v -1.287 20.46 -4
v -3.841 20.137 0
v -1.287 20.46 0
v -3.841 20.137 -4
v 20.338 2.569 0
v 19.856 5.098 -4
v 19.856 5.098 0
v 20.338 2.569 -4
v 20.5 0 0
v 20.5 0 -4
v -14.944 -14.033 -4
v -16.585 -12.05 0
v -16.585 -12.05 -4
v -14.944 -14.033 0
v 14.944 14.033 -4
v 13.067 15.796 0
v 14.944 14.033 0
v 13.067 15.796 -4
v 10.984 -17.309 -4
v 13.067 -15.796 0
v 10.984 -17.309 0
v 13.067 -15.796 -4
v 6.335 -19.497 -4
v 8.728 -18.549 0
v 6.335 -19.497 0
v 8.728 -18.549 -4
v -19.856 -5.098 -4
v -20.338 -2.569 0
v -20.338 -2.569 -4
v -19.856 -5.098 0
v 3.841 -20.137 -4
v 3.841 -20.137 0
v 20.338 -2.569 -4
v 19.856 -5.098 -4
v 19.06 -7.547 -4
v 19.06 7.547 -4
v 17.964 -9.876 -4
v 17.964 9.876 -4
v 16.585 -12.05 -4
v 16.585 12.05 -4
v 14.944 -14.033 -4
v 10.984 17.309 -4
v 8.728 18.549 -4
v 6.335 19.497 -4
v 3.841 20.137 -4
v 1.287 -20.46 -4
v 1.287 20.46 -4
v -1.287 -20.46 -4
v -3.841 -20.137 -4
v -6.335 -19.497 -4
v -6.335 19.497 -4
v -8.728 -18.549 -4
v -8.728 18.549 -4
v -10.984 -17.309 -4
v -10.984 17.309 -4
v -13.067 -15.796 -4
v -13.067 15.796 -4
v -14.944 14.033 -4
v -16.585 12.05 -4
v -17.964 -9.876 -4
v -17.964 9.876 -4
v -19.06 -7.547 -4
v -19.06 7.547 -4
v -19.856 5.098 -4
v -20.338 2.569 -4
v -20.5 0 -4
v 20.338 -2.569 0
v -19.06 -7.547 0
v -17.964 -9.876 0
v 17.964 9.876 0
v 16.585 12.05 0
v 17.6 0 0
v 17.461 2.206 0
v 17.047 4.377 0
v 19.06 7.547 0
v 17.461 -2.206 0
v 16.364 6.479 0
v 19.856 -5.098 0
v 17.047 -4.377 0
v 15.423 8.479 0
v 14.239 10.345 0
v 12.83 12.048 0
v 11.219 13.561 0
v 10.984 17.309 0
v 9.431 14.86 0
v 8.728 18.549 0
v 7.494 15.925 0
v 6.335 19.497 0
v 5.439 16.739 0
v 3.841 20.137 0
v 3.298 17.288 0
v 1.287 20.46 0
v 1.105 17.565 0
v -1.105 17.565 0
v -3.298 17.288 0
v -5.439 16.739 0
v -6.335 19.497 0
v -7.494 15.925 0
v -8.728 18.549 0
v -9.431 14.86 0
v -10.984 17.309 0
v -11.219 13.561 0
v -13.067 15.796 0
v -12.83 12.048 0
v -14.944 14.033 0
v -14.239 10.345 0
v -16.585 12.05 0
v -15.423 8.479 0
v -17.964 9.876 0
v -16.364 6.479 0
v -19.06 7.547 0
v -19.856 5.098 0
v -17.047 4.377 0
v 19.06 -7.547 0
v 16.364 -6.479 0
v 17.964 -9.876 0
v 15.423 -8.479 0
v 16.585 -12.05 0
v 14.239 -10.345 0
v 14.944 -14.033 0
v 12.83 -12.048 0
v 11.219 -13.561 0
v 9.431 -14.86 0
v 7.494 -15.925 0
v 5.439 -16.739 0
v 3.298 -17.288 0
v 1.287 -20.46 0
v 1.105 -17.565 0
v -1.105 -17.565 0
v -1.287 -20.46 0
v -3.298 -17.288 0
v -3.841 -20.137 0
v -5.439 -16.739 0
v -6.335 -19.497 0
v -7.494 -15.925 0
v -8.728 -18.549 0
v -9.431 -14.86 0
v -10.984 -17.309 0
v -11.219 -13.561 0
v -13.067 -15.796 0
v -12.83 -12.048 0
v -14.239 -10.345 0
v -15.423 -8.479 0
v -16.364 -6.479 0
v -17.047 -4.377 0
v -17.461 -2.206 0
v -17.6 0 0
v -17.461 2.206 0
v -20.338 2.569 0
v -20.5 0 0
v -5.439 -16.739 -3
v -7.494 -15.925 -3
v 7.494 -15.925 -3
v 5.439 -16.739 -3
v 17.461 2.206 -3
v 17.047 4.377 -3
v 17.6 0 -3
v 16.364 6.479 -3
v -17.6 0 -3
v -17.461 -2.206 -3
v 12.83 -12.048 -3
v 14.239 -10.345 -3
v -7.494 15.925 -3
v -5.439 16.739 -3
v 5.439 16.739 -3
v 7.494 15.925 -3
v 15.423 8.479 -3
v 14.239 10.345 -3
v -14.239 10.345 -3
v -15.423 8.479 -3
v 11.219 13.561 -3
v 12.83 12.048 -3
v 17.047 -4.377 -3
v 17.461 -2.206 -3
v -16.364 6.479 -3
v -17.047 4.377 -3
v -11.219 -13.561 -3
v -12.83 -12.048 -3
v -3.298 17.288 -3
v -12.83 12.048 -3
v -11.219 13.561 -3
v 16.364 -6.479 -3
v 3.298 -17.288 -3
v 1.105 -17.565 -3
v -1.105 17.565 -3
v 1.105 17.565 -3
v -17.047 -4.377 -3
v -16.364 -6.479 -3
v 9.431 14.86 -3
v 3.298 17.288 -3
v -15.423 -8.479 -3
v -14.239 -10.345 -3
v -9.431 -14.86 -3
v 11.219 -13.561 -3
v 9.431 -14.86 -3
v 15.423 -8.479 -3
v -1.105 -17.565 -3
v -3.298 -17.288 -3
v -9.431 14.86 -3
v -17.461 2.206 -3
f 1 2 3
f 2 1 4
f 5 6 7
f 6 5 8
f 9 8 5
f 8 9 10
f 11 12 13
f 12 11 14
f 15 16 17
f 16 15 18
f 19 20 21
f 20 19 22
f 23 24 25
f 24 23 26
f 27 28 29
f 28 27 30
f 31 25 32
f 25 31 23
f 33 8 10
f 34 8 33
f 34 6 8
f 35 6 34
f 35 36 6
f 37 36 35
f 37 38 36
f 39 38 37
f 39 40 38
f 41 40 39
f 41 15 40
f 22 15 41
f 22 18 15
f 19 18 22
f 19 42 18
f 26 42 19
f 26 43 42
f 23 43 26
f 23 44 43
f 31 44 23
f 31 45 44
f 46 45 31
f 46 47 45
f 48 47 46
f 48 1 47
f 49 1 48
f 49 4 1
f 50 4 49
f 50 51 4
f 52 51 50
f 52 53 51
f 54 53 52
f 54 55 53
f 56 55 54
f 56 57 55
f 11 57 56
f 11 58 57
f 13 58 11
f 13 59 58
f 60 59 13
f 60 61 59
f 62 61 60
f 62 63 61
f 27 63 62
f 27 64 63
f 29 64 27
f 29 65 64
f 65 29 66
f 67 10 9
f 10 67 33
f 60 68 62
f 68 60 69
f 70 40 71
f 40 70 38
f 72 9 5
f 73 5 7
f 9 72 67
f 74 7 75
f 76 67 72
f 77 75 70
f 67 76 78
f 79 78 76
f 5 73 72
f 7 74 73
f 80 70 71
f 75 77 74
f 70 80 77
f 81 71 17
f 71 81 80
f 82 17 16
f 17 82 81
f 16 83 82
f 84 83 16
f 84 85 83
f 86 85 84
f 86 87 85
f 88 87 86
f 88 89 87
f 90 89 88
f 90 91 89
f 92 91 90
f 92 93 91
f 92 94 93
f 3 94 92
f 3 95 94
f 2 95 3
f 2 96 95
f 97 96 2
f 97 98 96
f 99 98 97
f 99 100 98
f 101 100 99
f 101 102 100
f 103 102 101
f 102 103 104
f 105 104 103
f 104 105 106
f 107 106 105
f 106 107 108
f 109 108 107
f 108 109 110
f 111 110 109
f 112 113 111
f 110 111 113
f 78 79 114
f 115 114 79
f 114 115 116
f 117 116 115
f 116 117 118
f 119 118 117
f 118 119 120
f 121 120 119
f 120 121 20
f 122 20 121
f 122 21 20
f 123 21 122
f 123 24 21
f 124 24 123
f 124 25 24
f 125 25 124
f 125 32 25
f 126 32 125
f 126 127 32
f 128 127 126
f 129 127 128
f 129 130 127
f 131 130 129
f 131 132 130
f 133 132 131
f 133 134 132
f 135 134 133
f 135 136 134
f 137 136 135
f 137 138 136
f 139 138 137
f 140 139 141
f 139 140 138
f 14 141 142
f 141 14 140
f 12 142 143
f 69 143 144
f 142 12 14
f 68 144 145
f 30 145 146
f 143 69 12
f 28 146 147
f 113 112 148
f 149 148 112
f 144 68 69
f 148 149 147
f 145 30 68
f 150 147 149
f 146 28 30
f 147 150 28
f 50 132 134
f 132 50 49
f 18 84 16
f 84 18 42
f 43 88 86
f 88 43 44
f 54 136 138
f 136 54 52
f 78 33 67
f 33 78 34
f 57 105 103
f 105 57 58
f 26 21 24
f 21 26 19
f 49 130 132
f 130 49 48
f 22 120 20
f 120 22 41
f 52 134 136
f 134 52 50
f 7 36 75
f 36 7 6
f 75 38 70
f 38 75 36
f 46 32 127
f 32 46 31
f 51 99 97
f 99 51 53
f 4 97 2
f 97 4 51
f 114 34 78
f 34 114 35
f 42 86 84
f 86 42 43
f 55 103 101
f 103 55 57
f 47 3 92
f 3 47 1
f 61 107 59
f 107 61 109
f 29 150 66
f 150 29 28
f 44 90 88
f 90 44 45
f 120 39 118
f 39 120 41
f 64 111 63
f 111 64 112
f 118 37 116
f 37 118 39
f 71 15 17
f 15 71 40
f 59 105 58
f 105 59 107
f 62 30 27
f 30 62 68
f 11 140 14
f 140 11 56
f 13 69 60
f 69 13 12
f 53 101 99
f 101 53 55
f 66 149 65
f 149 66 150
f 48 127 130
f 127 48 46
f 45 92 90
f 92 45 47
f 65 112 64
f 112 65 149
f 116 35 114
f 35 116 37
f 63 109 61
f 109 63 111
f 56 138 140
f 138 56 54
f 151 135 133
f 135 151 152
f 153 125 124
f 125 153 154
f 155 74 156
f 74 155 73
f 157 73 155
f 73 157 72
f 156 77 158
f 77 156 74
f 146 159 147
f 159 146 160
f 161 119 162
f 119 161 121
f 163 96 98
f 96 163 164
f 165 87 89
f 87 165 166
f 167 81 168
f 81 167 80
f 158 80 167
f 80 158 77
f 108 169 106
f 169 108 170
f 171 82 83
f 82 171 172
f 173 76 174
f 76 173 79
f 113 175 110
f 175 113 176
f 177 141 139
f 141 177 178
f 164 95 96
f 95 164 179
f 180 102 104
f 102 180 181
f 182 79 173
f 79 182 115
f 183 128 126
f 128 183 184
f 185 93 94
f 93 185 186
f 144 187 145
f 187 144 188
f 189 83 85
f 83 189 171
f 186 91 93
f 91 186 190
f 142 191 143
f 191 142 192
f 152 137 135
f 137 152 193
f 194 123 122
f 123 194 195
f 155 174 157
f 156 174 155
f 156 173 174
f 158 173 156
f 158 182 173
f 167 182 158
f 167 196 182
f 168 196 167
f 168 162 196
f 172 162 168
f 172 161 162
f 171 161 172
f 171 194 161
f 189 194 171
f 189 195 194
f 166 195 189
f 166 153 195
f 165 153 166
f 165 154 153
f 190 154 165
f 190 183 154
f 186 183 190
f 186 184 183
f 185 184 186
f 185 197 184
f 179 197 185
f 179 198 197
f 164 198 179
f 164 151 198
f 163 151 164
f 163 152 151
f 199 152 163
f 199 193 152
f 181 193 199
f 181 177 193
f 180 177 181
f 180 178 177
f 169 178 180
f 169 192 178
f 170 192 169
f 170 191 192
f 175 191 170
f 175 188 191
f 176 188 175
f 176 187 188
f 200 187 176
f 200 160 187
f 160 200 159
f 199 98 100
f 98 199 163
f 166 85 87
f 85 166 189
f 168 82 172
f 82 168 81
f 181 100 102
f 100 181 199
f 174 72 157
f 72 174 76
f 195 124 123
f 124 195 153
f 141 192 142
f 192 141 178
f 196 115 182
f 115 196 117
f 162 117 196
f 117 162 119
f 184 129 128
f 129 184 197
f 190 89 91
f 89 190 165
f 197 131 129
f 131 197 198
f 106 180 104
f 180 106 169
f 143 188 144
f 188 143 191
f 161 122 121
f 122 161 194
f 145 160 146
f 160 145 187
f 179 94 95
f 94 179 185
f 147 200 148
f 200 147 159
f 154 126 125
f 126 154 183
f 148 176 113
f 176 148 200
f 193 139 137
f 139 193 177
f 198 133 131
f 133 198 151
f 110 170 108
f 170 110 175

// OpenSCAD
$fn = 50;


difference() {
	union() {
		translate(v = [0, 0, -4.0000000000]) {
			cylinder(h = 4, r = 20.5000000000);
		}
	}
	union() {
		#translate(v = [0, 0, -3.0000000000]) {
			cylinder(h = 3, r = 17.6000000000);
		}
	}
}
